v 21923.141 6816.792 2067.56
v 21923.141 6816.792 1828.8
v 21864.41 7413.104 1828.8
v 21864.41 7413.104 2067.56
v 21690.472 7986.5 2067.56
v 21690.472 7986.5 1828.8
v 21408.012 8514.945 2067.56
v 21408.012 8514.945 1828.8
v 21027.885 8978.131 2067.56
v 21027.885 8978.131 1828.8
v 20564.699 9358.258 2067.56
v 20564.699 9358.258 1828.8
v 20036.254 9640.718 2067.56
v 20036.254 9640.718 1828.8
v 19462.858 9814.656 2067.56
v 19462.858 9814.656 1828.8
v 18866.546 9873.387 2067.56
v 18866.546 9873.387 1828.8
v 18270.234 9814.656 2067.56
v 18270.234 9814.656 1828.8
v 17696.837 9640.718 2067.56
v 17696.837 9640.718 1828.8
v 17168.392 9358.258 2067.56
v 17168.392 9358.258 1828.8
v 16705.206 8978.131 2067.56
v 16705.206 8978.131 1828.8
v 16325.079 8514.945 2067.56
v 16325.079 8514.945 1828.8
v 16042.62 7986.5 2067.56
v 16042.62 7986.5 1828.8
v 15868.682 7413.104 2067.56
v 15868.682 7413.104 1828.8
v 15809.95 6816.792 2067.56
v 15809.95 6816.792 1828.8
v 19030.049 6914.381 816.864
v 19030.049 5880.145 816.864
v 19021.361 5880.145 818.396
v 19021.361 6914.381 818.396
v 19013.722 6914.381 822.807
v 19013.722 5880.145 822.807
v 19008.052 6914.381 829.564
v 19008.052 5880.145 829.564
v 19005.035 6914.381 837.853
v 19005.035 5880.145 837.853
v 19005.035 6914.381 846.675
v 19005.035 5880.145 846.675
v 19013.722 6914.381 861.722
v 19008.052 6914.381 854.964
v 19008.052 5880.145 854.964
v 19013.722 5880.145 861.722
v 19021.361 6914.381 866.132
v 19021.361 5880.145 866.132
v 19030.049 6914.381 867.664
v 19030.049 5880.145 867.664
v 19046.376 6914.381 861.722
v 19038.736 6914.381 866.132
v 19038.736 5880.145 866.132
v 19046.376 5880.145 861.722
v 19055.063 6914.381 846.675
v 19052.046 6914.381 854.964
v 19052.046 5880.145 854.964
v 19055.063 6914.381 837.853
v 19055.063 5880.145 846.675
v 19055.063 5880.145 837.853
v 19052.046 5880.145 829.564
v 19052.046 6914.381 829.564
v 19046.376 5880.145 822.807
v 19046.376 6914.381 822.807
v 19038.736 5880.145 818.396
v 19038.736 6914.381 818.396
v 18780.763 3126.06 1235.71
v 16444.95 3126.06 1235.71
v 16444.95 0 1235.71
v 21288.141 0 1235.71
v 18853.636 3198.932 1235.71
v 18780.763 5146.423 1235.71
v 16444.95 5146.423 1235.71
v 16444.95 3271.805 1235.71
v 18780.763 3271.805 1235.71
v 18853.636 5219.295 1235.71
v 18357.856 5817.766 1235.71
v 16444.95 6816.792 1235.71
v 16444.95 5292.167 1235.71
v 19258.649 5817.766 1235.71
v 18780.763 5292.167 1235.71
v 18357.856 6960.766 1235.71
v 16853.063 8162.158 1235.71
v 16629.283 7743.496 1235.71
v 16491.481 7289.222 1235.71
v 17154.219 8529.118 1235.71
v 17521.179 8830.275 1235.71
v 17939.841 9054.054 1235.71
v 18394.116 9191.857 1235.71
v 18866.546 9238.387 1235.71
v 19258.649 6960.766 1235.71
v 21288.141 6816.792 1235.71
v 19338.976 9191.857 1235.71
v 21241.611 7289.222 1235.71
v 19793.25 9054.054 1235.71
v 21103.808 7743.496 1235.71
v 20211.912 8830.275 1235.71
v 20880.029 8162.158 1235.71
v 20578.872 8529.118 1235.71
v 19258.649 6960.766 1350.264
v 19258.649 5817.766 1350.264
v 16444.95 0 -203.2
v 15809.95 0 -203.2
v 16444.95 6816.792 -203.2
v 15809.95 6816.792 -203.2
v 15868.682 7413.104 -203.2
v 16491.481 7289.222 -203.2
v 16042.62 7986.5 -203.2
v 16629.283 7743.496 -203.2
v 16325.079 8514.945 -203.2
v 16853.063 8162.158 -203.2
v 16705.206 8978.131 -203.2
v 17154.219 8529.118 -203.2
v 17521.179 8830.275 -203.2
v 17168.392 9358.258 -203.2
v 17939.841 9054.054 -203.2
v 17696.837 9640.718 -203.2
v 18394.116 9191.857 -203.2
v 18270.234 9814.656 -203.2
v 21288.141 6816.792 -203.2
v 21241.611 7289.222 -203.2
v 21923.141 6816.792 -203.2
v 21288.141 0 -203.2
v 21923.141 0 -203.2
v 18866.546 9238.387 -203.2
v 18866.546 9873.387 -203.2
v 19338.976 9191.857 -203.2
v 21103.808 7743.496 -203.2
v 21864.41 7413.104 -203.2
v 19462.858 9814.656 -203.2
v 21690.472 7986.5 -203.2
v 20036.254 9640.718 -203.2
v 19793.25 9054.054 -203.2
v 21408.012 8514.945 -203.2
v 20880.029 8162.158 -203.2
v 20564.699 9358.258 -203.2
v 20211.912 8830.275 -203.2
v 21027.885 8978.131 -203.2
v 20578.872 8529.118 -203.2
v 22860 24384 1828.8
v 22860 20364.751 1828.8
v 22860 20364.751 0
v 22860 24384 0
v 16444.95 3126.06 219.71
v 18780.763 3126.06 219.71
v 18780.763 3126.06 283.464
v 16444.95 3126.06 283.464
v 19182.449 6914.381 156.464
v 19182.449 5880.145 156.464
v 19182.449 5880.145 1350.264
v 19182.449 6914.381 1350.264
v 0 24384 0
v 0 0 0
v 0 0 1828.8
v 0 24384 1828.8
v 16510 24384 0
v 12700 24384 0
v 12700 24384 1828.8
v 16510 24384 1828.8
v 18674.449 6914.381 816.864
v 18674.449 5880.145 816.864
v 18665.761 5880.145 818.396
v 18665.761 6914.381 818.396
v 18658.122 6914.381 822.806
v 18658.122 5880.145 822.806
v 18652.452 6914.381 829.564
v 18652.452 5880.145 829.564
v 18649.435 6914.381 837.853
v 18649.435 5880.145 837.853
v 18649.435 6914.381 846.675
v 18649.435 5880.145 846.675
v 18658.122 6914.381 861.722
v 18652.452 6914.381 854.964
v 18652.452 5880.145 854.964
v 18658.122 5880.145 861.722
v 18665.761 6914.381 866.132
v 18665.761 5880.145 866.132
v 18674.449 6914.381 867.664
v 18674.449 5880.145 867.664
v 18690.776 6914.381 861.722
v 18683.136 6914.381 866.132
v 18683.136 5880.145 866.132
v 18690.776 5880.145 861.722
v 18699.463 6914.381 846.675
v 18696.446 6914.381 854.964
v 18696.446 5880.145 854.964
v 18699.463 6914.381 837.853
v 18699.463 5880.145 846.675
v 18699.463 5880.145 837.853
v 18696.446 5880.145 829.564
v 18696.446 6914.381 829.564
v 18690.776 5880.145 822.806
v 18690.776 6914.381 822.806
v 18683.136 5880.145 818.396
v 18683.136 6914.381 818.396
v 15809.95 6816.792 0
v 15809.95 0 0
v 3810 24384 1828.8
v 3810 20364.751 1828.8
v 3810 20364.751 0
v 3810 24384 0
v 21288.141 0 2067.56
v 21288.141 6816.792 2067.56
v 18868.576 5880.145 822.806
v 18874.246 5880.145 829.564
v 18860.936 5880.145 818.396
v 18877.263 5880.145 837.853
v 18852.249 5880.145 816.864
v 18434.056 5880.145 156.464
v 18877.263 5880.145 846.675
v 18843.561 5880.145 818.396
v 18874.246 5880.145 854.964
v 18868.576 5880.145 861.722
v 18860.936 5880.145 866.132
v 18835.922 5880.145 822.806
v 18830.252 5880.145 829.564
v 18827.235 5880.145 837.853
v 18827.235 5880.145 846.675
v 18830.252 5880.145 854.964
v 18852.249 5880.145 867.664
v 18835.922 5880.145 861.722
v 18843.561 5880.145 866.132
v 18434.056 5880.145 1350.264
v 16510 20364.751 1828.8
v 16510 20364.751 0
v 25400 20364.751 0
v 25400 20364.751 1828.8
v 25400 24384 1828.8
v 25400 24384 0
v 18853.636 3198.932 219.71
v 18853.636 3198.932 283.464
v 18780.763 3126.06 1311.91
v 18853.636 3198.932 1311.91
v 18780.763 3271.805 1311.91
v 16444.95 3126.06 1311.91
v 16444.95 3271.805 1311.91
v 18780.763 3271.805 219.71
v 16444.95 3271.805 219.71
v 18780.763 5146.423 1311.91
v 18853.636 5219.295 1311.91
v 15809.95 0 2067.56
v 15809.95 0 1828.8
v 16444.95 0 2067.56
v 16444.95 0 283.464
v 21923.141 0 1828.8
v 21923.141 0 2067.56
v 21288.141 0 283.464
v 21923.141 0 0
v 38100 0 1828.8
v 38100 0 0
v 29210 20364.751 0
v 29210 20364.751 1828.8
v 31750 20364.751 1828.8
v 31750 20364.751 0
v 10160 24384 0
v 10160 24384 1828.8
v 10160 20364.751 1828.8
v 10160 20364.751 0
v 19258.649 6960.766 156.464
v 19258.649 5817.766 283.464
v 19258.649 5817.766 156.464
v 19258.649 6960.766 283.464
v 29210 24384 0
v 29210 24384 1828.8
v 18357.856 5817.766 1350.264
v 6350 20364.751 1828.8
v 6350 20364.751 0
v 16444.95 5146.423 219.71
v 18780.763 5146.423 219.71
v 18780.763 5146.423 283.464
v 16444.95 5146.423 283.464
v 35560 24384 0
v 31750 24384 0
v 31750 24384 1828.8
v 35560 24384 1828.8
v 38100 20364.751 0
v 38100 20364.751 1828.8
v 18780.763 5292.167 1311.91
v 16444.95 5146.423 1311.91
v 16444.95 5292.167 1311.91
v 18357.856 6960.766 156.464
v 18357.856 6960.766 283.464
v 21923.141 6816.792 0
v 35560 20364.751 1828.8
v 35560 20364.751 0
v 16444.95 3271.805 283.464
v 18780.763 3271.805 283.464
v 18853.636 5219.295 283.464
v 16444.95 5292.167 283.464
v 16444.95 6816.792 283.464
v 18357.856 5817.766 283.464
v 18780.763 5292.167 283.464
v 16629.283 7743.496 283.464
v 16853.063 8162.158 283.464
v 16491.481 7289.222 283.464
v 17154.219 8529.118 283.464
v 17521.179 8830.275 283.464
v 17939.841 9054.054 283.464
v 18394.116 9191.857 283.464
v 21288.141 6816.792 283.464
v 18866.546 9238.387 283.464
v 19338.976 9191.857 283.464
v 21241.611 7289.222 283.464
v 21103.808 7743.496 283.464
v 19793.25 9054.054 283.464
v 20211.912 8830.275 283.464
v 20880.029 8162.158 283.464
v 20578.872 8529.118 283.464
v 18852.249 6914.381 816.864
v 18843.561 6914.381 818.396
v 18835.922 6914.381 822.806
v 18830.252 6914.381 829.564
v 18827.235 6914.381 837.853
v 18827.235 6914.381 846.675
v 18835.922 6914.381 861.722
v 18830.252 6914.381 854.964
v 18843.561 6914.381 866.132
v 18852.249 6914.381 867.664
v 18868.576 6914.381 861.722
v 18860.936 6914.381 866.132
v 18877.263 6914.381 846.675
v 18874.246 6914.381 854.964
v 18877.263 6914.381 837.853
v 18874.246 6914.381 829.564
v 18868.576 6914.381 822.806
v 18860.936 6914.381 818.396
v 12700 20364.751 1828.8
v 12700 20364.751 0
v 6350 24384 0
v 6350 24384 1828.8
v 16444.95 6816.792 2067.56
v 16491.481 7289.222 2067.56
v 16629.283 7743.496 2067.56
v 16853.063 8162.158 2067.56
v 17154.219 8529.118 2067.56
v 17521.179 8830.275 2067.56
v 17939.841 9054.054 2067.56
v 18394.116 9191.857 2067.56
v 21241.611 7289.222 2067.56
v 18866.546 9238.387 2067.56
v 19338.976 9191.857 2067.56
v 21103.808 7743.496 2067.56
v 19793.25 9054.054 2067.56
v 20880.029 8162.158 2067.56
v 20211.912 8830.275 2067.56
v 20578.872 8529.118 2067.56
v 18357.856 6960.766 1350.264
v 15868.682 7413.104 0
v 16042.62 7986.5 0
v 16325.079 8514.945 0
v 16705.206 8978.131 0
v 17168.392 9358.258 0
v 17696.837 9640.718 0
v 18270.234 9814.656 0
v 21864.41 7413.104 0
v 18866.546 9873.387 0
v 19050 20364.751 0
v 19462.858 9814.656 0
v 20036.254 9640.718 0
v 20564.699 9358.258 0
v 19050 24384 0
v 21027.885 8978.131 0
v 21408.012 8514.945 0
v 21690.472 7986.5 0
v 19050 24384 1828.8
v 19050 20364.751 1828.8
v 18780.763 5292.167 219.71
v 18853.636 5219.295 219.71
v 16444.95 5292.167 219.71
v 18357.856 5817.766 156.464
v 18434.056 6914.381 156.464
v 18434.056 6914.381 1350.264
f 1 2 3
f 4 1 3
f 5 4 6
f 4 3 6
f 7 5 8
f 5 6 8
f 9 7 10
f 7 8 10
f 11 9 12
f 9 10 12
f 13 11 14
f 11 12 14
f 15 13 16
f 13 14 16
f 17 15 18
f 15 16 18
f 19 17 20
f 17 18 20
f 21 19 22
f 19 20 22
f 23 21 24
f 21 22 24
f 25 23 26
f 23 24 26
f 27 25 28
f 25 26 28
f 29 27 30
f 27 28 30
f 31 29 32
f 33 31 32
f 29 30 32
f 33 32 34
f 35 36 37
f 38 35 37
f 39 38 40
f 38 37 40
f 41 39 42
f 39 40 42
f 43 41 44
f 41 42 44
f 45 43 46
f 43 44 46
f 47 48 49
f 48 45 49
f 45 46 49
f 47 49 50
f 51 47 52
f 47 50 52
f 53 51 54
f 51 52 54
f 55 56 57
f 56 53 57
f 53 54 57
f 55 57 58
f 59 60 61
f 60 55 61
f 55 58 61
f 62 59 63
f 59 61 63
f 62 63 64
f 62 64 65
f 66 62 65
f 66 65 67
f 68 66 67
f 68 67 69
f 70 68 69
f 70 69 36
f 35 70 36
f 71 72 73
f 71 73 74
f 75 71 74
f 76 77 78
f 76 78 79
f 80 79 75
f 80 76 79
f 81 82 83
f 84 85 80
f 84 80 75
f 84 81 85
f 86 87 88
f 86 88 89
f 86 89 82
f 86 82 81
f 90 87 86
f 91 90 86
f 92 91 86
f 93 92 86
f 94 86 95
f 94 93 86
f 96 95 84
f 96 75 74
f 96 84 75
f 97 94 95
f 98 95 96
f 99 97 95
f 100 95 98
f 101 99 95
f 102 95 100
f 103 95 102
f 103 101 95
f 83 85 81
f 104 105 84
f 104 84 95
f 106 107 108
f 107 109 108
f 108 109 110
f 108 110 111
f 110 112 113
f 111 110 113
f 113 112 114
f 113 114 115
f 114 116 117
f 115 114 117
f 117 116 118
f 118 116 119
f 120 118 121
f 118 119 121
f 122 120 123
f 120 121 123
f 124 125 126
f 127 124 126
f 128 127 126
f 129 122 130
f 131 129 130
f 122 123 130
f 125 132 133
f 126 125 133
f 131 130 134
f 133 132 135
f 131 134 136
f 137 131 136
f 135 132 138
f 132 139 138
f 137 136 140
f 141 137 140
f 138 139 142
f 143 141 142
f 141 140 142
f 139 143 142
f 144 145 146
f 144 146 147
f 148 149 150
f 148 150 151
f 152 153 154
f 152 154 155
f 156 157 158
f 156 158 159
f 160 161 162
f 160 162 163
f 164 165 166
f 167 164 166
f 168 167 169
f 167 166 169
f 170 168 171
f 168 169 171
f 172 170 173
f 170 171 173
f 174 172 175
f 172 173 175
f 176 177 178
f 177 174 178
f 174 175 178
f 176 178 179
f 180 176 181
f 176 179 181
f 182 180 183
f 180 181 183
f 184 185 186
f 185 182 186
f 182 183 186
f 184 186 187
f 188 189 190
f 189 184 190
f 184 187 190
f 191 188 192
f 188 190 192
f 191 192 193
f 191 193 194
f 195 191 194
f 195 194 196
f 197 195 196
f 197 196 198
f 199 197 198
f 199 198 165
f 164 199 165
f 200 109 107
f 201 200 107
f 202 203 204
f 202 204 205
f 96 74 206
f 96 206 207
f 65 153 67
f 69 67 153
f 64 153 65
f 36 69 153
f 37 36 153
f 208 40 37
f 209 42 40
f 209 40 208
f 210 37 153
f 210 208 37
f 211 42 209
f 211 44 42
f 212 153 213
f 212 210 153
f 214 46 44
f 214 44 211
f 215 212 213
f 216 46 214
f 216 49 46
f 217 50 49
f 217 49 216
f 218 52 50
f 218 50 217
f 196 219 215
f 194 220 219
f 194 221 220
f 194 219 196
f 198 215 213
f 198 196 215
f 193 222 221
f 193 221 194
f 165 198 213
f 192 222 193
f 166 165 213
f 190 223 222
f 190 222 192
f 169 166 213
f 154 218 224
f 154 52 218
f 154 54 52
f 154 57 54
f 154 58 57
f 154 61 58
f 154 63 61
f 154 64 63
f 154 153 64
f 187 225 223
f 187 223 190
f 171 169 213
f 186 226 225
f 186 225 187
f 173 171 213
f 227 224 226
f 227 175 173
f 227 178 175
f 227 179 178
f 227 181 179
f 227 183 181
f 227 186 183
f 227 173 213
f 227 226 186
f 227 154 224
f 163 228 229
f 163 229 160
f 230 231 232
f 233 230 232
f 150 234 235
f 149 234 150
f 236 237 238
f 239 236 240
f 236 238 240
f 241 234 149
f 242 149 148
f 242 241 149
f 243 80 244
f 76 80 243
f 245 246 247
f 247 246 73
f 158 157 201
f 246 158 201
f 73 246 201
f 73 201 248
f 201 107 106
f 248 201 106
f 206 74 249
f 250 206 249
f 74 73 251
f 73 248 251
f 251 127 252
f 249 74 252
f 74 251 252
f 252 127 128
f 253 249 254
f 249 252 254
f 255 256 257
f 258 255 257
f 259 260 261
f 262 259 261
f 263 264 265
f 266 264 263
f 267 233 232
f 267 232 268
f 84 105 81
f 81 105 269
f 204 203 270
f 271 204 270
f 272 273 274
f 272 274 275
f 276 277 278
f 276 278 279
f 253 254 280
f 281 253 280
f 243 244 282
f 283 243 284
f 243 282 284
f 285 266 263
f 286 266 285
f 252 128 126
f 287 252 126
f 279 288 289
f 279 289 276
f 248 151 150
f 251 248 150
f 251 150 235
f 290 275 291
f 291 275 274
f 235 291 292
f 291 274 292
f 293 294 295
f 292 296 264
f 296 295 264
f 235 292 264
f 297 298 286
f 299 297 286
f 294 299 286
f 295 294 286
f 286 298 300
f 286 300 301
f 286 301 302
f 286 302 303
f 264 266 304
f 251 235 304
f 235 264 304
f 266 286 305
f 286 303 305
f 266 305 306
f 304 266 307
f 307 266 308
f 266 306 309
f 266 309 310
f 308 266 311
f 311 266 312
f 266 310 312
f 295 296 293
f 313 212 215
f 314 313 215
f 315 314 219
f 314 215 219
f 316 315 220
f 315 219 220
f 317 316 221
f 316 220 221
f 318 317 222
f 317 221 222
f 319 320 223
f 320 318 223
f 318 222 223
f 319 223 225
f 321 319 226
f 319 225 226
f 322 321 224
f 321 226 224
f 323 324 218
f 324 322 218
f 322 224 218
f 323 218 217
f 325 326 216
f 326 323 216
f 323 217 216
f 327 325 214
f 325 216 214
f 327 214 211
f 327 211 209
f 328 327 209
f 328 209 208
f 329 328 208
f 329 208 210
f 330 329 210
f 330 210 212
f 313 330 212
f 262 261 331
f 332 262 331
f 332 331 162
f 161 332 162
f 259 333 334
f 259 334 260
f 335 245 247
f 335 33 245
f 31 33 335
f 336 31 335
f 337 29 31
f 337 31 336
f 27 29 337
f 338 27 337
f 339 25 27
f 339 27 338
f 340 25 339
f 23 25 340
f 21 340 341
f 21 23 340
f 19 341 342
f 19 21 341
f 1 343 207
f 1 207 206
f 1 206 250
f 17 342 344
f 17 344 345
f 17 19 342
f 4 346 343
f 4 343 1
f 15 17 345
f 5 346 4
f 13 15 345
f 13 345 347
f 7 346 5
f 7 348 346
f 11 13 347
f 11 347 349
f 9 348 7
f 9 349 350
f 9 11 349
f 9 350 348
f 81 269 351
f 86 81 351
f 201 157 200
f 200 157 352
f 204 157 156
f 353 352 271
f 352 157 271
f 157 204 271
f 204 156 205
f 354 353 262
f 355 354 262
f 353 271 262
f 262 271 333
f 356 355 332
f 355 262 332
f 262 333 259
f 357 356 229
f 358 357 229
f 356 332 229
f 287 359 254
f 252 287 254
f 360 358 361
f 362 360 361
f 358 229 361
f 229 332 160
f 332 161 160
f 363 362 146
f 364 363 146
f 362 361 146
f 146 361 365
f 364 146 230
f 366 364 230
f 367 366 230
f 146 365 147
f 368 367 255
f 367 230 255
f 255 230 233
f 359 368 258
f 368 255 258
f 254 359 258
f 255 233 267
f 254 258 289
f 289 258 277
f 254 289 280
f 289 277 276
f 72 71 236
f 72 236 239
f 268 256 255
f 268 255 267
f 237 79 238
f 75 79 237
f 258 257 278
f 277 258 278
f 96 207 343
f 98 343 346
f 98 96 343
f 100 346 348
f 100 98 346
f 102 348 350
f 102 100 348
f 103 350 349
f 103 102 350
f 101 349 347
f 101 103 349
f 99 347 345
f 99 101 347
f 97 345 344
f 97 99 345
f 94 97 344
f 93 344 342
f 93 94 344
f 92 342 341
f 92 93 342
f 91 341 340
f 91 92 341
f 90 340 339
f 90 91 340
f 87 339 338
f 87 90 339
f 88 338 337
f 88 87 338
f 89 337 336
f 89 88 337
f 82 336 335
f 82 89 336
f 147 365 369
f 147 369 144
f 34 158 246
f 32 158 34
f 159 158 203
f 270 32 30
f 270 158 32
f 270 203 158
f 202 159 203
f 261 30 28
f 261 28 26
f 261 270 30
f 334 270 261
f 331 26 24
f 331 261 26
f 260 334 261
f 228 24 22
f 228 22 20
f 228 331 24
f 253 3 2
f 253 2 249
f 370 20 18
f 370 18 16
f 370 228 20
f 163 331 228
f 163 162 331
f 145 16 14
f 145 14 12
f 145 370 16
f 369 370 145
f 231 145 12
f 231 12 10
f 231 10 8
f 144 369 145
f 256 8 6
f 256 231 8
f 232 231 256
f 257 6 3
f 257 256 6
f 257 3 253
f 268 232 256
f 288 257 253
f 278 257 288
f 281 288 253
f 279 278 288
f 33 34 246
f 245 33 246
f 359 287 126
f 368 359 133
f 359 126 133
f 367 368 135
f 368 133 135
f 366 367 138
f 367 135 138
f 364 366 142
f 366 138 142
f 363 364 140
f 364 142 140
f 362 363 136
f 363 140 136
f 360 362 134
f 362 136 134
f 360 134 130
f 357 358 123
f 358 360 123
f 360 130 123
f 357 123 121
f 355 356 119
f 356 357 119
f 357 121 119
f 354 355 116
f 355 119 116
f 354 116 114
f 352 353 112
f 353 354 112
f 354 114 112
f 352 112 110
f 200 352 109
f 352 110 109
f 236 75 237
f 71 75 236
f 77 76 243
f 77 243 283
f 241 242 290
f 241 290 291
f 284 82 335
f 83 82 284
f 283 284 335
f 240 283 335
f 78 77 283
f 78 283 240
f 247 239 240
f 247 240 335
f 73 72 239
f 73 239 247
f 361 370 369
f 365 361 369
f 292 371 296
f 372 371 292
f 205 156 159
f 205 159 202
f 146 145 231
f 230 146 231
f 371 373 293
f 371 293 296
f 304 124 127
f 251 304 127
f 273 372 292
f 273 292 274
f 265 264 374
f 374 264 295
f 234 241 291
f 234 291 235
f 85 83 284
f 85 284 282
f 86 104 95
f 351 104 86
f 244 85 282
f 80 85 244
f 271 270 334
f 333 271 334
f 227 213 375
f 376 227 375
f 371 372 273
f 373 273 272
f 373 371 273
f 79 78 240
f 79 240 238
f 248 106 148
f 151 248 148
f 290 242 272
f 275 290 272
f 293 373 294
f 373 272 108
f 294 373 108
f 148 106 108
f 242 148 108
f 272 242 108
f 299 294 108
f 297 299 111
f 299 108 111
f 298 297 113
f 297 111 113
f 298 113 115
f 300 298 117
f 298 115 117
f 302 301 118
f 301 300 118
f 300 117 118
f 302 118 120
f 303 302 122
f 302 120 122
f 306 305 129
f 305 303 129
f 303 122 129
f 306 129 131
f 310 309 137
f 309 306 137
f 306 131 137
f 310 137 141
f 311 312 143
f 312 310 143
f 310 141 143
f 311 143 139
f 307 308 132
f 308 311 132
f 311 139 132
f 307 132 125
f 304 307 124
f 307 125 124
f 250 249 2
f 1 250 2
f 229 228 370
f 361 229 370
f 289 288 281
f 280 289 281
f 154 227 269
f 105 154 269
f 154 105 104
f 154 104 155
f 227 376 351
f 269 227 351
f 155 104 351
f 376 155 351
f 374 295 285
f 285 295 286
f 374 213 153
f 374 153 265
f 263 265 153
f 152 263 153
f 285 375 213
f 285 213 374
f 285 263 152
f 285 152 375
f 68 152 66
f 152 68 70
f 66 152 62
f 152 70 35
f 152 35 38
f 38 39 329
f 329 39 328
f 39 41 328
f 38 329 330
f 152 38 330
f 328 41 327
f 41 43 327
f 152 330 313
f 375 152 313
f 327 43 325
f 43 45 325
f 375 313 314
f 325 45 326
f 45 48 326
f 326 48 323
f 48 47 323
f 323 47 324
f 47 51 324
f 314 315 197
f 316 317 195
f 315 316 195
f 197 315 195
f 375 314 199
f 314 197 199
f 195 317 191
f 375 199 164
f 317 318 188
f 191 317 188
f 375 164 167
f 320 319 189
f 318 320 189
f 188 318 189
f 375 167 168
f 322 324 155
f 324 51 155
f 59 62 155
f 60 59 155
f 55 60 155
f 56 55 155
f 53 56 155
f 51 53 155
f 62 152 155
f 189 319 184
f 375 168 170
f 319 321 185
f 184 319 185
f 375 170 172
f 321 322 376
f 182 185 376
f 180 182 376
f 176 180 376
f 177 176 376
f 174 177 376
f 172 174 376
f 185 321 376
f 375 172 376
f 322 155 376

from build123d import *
from build123d.topology import SkipClean

# Parameters (mm, degrees)
SKETCH1_W                = 38100
SKETCH1_H                = 24384
BOSS_EXTRUDE1_DEPTH      = 1828.8
SKETCH2_W                = 2540
SKETCH2_H                = 4019.249447419
CUT_EXTRUDE2_DEPTH       = 1828.8
CUT_EXTRUDE7_DEPTH       = 283.464
CUT_EXTRUDE9_START       = -593.09
CUT_EXTRUDE9_DEPTH       = 593.09
SKETCH5_W                = 748.392768262
SKETCH5_H                = 1034.235711045
CUT_EXTRUDE10_DEPTH      = 2197.608
BOSS_EXTRUDE2_DEPTH      = 127
BOSS_EXTRUDE2_DEPTH_BACK = 1066.8
SKETCH8_W                = 900.792768262
SKETCH8_H                = 1143
SKETCH8_W_2              = 748.392768262
SKETCH8_H_2              = 1034.235711045
SKETCH9_R                = 25.4
BOSS_EXTRUDE3_DEPTH      = 1070.61
BOSS_EXTRUDE4_DEPTH      = 76.2
BOSS_EXTRUDE4_DEPTH_BACK = 1016
BOSS_EXTRUDE5_DEPTH      = 238.76
BOSS_EXTRUDE5_DEPTH_BACK = 2032


with BuildPart() as part:
    # Sketch1 → Boss-Extrude1 (new body)
    with BuildSketch(Plane.XY):
        with Locations((19050, 12192)):
            Rectangle(SKETCH1_W, SKETCH1_H)
    extrude(amount=BOSS_EXTRUDE1_DEPTH)

    # Sketch2 → Cut-Extrude2 (cut)
    with BuildSketch(Plane.XY.offset(1828.8)):
        with Locations((5080, 22374.37527629)):
            Rectangle(SKETCH2_W, SKETCH2_H)
        with Locations((11430, 22374.37527629)):
            Rectangle(SKETCH2_W, SKETCH2_H)
        with Locations((17780, 22374.37527629)):
            Rectangle(SKETCH2_W, SKETCH2_H)
        with Locations((24130, 22374.37527629)):
            Rectangle(SKETCH2_W, SKETCH2_H)
        with Locations((30480, 22374.37527629)):
            Rectangle(SKETCH2_W, SKETCH2_H)
        with Locations((36830, 22374.37527629)):
            Rectangle(SKETCH2_W, SKETCH2_H)
    extrude(amount=-CUT_EXTRUDE2_DEPTH, mode=Mode.SUBTRACT)

    # Sketch3 → Cut-Extrude7 (cut)
    with BuildSketch(Plane(origin=(0, 0, 0), x_dir=(-1, 0, 0), z_dir=(0, 0, -1))):
        with BuildLine():
            Line((-16444.950240223, 0), (-21288.141342907, 0))
            Line((-21288.141342907, 0), (-21288.141342907, 6816.791692855))
            ThreePointArc((-21288.141342907, 6816.791692855), (-18866.545791565, 9238.387244197), (-16444.950240223, 6816.791692855))
            Line((-16444.950240223, 6816.791692855), (-16444.950240223, 0))
        make_face()
    extrude(amount=-CUT_EXTRUDE7_DEPTH, mode=Mode.SUBTRACT)

    # Sketch6 → Cut-Extrude9 (cut)
    with BuildSketch(Plane.XY.offset(1828.8).offset(CUT_EXTRUDE9_START)):
        with BuildLine():
            Line((16444.950240223, 0), (21288.141342907, 0))
            Line((21288.141342907, 0), (21288.141342907, 6816.791692855))
            ThreePointArc((21288.141342907, 6816.791692855), (20578.87242721, 8529.1183285), (18866.545791565, 9238.387244197))
            ThreePointArc((18866.545791565, 9238.387244197), (17154.21915592, 8529.1183285), (16444.950240223, 6816.791692855))
            Line((16444.950240223, 6816.791692855), (16444.950240223, 0))
        make_face()
    extrude(amount=CUT_EXTRUDE9_DEPTH, mode=Mode.SUBTRACT)

    # Sketch5 → Cut-Extrude10 (cut)
    with BuildSketch(Plane(origin=(0, 0, 283.464), x_dir=(-1, 0, 0), z_dir=(0, 0, -1))):
        with Locations((-18808.252380156, 6397.263349082)):
            Rectangle(SKETCH5_W, SKETCH5_H)
    extrude(amount=-CUT_EXTRUDE10_DEPTH, mode=Mode.SUBTRACT)

    # Sketch8 → Boss-Extrude2 (add, two sides: drawn at the far end of the back side and taken through both)
    with BuildSketch(Plane(origin=(0, 0, 283.464), x_dir=(-1, 0, 0), z_dir=(0, 0, -1)).offset(-BOSS_EXTRUDE2_DEPTH_BACK)):
        with Locations((-18808.252380156, 6389.266447281)):
            Rectangle(SKETCH8_W, SKETCH8_H)
        with Locations((-18808.252380156, 6397.263349082)):
            Rectangle(SKETCH8_W_2, SKETCH8_H_2, mode=Mode.SUBTRACT)
    extrude(amount=BOSS_EXTRUDE2_DEPTH + BOSS_EXTRUDE2_DEPTH_BACK)

    # Sketch9 → Boss-Extrude3 (add)
    with BuildSketch(Plane(origin=(0, 5880.145493559, 0), x_dir=(1, 0, 0), z_dir=(0, 1, 0))):
        with Locations((18852.248764287, -842.264)):
            Circle(SKETCH9_R)
        with Locations((19030.048764287, -842.264096753)):
            Circle(SKETCH9_R)
        with Locations((18674.448764287, -842.264)):
            Circle(SKETCH9_R)
    extrude(amount=BOSS_EXTRUDE3_DEPTH)

    # Sketch10 → Boss-Extrude4 (add, two sides: drawn at the far end of the back side and taken through both)
    with BuildSketch(Plane.XY.offset(1235.71).offset(-BOSS_EXTRUDE4_DEPTH_BACK)):
        Polygon((16444.950240223, 5292.167188251), (18780.763172563, 5292.167188251), (18853.635500849, 5219.294859965), (18780.763172563, 5146.422531679), (16444.950240223, 5146.422531679), align=None)
        Polygon((16444.950240223, 3271.804815759), (18780.763172563, 3271.804815759), (18853.635500849, 3198.932487473), (18780.763172563, 3126.060159187), (16444.950240223, 3126.060159187), align=None)
    extrude(amount=BOSS_EXTRUDE4_DEPTH + BOSS_EXTRUDE4_DEPTH_BACK)

    # Sketch11 → Boss-Extrude5 (add, two sides: drawn at the far end of the back side and taken through both)
    with SkipClean():  # the faces are left unmerged after this step: merging them gives an invalid solid
        with BuildSketch(Plane.XY.offset(1828.8).offset(-BOSS_EXTRUDE5_DEPTH_BACK)):
            with BuildLine():
                Line((15809.950240223, 0), (16444.950240223, 0))
                Line((16444.950240223, 0), (16444.950240223, 6816.791692855))
                ThreePointArc((16444.950240223, 6816.791692855), (18866.545791565, 9238.387244197), (21288.141342907, 6816.791692855))
                Line((21288.141342907, 6816.791692855), (21288.141342907, 0))
                Line((21288.141342907, 0), (21923.141342907, 0))
                Line((21923.141342907, 0), (21923.141342907, 6816.791692855))
                ThreePointArc((21923.141342907, 6816.791692855), (18866.545791565, 9873.387244197), (15809.950240223, 6816.791692855))
                Line((15809.950240223, 6816.791692855), (15809.950240223, 0))
            make_face()
        extrude(amount=BOSS_EXTRUDE5_DEPTH + BOSS_EXTRUDE5_DEPTH_BACK)
    add(part.part.scale(1), mode=Mode.REPLACE)  # the faces are merged on a copy


solid = part.part
